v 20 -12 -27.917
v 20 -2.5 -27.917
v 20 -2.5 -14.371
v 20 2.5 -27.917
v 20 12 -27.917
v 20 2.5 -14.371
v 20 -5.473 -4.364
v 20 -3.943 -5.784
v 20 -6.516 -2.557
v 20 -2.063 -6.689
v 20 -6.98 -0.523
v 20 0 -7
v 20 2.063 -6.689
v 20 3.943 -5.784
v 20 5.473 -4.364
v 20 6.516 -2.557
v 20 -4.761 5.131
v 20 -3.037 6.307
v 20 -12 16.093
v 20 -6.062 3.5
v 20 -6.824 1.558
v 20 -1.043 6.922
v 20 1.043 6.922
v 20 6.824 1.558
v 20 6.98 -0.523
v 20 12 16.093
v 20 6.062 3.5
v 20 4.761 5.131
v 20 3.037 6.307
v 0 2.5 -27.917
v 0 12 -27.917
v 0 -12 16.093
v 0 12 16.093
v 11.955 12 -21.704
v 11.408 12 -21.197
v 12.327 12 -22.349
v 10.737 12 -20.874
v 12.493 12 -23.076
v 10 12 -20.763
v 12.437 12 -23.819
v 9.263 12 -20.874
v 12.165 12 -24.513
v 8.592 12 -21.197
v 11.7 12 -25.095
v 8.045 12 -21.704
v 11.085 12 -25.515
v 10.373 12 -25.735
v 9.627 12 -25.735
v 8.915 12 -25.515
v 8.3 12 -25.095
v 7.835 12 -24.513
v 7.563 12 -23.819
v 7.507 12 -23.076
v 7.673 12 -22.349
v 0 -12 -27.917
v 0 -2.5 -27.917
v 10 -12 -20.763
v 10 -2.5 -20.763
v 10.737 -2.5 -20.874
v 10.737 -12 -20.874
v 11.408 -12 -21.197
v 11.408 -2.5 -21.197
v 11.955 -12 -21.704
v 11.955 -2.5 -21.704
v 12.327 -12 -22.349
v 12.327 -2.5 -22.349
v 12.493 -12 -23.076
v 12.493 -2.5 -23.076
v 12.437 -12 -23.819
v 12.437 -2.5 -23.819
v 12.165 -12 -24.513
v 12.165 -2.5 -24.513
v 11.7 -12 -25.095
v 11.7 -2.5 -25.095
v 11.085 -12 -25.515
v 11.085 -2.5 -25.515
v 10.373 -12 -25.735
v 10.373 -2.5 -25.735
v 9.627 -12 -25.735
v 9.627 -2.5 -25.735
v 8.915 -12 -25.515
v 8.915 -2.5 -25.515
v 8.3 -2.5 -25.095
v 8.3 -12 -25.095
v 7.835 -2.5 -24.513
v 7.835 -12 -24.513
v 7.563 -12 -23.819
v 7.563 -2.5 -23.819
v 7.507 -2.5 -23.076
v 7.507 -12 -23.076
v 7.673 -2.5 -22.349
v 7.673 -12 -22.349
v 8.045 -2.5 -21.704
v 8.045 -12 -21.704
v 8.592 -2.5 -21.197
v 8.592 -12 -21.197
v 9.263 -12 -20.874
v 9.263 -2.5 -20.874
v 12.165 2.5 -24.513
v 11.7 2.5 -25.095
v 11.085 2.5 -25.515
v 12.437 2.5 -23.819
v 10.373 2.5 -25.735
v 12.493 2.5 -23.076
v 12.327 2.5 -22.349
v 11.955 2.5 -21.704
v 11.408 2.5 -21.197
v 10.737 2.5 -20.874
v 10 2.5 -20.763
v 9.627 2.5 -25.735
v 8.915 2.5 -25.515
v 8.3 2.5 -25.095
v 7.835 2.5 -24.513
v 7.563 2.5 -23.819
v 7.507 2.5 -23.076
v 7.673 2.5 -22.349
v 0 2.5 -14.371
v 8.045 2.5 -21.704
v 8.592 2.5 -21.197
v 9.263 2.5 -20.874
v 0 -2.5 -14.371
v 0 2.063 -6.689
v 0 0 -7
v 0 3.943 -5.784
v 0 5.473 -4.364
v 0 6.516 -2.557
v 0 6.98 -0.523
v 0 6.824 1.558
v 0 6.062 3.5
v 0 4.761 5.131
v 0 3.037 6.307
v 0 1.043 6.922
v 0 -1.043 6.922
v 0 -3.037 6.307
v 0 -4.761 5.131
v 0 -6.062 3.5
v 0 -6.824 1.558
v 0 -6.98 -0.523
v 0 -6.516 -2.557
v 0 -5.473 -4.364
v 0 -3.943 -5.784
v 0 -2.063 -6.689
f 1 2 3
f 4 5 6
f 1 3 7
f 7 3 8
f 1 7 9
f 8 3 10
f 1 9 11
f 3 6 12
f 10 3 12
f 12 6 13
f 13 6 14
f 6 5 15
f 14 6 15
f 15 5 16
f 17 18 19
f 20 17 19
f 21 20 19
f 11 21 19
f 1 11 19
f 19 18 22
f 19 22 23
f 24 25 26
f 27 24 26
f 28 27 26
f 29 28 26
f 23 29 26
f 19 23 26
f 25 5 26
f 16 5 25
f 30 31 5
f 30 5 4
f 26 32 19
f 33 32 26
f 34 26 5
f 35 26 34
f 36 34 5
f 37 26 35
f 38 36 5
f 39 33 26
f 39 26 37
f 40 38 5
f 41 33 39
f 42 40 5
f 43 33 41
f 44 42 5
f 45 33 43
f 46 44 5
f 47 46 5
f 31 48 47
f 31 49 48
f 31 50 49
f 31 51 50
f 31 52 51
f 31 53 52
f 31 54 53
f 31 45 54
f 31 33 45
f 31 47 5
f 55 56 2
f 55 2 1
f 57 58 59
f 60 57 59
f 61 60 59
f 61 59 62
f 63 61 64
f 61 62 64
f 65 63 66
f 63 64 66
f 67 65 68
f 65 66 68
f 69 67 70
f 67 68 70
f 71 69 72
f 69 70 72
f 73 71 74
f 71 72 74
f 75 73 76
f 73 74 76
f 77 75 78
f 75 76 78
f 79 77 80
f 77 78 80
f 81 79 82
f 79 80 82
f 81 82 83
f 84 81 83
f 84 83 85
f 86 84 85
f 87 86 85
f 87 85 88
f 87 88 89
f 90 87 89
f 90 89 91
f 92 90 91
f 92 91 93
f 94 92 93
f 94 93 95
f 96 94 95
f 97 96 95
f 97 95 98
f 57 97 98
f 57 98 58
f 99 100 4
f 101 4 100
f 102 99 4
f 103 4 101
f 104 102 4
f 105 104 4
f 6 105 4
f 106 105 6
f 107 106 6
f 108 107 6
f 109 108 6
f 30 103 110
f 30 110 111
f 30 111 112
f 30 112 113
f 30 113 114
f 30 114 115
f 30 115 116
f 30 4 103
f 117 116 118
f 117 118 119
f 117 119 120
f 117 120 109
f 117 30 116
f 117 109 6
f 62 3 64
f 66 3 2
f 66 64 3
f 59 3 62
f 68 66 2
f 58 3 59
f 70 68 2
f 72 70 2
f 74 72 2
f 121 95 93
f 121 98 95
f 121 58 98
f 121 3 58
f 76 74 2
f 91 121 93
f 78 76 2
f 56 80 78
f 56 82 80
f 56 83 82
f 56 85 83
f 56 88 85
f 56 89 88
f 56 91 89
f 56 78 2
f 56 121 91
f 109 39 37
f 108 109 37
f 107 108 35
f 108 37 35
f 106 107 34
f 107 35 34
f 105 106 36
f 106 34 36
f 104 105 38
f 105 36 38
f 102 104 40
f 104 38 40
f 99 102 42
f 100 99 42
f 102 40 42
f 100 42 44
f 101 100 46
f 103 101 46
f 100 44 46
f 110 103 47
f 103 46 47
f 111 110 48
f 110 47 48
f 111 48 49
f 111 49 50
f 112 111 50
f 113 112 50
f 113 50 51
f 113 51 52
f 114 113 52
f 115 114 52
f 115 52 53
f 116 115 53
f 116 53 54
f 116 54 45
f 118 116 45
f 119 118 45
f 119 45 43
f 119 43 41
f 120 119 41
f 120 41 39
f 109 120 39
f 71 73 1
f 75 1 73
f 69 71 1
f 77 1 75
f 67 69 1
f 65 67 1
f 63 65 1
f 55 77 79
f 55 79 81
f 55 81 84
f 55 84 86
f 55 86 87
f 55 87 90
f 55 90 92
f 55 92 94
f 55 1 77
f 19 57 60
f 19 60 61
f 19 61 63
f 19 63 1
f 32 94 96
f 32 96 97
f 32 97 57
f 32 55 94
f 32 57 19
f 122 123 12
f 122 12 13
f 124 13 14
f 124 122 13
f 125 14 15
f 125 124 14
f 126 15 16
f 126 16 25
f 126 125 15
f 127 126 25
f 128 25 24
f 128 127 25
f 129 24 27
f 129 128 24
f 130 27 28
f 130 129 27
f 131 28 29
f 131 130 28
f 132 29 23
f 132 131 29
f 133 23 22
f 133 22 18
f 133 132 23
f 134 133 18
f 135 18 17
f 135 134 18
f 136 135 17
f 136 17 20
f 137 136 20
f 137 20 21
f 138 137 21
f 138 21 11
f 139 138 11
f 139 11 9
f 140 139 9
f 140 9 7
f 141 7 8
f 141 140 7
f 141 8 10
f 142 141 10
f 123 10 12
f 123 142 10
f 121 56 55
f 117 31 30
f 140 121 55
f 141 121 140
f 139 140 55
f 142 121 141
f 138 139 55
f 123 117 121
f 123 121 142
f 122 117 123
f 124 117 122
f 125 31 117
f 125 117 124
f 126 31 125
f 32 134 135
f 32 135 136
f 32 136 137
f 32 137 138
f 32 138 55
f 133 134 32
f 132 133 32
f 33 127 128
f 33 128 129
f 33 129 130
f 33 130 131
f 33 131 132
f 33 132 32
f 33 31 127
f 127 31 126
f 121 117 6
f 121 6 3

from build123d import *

# Parameters (mm, degrees)
SKETCH_1_R          = 7
EXTRUDE_1_DEPTH     = 20
SKETCH_2_R          = 2.5
CUT_EXTRUDE_2_DEPTH = 42.896701285


with BuildPart() as part:
    # Эскиз1 → Вытянуть1 (new body)
    with BuildSketch(Plane(origin=(0, 0, 0), x_dir=(0, 0, -1), z_dir=(1, 0, 0))):
        Polygon((-16.093397181, 12), (27.91654668, 12), (27.91654668, 2.5), (14.371474957, 2.5), (14.371474957, -2.5), (27.91654668, -2.5), (27.91654668, -12), (-16.093397181, -12), align=None)
        Circle(SKETCH_1_R, mode=Mode.SUBTRACT)
    extrude(amount=EXTRUDE_1_DEPTH)

    # Эскиз2 → Вытянуть2 (cut, through all)
    with BuildSketch(Plane(origin=(0, 12, 0), x_dir=(1, 0, 0), z_dir=(0, 1, 0))):
        with Locations(Location((10, 23.262831067, 0), (0, 0, 270))):
            Circle(SKETCH_2_R)
    extrude(amount=-CUT_EXTRUDE_2_DEPTH, mode=Mode.SUBTRACT)


solid = part.part
